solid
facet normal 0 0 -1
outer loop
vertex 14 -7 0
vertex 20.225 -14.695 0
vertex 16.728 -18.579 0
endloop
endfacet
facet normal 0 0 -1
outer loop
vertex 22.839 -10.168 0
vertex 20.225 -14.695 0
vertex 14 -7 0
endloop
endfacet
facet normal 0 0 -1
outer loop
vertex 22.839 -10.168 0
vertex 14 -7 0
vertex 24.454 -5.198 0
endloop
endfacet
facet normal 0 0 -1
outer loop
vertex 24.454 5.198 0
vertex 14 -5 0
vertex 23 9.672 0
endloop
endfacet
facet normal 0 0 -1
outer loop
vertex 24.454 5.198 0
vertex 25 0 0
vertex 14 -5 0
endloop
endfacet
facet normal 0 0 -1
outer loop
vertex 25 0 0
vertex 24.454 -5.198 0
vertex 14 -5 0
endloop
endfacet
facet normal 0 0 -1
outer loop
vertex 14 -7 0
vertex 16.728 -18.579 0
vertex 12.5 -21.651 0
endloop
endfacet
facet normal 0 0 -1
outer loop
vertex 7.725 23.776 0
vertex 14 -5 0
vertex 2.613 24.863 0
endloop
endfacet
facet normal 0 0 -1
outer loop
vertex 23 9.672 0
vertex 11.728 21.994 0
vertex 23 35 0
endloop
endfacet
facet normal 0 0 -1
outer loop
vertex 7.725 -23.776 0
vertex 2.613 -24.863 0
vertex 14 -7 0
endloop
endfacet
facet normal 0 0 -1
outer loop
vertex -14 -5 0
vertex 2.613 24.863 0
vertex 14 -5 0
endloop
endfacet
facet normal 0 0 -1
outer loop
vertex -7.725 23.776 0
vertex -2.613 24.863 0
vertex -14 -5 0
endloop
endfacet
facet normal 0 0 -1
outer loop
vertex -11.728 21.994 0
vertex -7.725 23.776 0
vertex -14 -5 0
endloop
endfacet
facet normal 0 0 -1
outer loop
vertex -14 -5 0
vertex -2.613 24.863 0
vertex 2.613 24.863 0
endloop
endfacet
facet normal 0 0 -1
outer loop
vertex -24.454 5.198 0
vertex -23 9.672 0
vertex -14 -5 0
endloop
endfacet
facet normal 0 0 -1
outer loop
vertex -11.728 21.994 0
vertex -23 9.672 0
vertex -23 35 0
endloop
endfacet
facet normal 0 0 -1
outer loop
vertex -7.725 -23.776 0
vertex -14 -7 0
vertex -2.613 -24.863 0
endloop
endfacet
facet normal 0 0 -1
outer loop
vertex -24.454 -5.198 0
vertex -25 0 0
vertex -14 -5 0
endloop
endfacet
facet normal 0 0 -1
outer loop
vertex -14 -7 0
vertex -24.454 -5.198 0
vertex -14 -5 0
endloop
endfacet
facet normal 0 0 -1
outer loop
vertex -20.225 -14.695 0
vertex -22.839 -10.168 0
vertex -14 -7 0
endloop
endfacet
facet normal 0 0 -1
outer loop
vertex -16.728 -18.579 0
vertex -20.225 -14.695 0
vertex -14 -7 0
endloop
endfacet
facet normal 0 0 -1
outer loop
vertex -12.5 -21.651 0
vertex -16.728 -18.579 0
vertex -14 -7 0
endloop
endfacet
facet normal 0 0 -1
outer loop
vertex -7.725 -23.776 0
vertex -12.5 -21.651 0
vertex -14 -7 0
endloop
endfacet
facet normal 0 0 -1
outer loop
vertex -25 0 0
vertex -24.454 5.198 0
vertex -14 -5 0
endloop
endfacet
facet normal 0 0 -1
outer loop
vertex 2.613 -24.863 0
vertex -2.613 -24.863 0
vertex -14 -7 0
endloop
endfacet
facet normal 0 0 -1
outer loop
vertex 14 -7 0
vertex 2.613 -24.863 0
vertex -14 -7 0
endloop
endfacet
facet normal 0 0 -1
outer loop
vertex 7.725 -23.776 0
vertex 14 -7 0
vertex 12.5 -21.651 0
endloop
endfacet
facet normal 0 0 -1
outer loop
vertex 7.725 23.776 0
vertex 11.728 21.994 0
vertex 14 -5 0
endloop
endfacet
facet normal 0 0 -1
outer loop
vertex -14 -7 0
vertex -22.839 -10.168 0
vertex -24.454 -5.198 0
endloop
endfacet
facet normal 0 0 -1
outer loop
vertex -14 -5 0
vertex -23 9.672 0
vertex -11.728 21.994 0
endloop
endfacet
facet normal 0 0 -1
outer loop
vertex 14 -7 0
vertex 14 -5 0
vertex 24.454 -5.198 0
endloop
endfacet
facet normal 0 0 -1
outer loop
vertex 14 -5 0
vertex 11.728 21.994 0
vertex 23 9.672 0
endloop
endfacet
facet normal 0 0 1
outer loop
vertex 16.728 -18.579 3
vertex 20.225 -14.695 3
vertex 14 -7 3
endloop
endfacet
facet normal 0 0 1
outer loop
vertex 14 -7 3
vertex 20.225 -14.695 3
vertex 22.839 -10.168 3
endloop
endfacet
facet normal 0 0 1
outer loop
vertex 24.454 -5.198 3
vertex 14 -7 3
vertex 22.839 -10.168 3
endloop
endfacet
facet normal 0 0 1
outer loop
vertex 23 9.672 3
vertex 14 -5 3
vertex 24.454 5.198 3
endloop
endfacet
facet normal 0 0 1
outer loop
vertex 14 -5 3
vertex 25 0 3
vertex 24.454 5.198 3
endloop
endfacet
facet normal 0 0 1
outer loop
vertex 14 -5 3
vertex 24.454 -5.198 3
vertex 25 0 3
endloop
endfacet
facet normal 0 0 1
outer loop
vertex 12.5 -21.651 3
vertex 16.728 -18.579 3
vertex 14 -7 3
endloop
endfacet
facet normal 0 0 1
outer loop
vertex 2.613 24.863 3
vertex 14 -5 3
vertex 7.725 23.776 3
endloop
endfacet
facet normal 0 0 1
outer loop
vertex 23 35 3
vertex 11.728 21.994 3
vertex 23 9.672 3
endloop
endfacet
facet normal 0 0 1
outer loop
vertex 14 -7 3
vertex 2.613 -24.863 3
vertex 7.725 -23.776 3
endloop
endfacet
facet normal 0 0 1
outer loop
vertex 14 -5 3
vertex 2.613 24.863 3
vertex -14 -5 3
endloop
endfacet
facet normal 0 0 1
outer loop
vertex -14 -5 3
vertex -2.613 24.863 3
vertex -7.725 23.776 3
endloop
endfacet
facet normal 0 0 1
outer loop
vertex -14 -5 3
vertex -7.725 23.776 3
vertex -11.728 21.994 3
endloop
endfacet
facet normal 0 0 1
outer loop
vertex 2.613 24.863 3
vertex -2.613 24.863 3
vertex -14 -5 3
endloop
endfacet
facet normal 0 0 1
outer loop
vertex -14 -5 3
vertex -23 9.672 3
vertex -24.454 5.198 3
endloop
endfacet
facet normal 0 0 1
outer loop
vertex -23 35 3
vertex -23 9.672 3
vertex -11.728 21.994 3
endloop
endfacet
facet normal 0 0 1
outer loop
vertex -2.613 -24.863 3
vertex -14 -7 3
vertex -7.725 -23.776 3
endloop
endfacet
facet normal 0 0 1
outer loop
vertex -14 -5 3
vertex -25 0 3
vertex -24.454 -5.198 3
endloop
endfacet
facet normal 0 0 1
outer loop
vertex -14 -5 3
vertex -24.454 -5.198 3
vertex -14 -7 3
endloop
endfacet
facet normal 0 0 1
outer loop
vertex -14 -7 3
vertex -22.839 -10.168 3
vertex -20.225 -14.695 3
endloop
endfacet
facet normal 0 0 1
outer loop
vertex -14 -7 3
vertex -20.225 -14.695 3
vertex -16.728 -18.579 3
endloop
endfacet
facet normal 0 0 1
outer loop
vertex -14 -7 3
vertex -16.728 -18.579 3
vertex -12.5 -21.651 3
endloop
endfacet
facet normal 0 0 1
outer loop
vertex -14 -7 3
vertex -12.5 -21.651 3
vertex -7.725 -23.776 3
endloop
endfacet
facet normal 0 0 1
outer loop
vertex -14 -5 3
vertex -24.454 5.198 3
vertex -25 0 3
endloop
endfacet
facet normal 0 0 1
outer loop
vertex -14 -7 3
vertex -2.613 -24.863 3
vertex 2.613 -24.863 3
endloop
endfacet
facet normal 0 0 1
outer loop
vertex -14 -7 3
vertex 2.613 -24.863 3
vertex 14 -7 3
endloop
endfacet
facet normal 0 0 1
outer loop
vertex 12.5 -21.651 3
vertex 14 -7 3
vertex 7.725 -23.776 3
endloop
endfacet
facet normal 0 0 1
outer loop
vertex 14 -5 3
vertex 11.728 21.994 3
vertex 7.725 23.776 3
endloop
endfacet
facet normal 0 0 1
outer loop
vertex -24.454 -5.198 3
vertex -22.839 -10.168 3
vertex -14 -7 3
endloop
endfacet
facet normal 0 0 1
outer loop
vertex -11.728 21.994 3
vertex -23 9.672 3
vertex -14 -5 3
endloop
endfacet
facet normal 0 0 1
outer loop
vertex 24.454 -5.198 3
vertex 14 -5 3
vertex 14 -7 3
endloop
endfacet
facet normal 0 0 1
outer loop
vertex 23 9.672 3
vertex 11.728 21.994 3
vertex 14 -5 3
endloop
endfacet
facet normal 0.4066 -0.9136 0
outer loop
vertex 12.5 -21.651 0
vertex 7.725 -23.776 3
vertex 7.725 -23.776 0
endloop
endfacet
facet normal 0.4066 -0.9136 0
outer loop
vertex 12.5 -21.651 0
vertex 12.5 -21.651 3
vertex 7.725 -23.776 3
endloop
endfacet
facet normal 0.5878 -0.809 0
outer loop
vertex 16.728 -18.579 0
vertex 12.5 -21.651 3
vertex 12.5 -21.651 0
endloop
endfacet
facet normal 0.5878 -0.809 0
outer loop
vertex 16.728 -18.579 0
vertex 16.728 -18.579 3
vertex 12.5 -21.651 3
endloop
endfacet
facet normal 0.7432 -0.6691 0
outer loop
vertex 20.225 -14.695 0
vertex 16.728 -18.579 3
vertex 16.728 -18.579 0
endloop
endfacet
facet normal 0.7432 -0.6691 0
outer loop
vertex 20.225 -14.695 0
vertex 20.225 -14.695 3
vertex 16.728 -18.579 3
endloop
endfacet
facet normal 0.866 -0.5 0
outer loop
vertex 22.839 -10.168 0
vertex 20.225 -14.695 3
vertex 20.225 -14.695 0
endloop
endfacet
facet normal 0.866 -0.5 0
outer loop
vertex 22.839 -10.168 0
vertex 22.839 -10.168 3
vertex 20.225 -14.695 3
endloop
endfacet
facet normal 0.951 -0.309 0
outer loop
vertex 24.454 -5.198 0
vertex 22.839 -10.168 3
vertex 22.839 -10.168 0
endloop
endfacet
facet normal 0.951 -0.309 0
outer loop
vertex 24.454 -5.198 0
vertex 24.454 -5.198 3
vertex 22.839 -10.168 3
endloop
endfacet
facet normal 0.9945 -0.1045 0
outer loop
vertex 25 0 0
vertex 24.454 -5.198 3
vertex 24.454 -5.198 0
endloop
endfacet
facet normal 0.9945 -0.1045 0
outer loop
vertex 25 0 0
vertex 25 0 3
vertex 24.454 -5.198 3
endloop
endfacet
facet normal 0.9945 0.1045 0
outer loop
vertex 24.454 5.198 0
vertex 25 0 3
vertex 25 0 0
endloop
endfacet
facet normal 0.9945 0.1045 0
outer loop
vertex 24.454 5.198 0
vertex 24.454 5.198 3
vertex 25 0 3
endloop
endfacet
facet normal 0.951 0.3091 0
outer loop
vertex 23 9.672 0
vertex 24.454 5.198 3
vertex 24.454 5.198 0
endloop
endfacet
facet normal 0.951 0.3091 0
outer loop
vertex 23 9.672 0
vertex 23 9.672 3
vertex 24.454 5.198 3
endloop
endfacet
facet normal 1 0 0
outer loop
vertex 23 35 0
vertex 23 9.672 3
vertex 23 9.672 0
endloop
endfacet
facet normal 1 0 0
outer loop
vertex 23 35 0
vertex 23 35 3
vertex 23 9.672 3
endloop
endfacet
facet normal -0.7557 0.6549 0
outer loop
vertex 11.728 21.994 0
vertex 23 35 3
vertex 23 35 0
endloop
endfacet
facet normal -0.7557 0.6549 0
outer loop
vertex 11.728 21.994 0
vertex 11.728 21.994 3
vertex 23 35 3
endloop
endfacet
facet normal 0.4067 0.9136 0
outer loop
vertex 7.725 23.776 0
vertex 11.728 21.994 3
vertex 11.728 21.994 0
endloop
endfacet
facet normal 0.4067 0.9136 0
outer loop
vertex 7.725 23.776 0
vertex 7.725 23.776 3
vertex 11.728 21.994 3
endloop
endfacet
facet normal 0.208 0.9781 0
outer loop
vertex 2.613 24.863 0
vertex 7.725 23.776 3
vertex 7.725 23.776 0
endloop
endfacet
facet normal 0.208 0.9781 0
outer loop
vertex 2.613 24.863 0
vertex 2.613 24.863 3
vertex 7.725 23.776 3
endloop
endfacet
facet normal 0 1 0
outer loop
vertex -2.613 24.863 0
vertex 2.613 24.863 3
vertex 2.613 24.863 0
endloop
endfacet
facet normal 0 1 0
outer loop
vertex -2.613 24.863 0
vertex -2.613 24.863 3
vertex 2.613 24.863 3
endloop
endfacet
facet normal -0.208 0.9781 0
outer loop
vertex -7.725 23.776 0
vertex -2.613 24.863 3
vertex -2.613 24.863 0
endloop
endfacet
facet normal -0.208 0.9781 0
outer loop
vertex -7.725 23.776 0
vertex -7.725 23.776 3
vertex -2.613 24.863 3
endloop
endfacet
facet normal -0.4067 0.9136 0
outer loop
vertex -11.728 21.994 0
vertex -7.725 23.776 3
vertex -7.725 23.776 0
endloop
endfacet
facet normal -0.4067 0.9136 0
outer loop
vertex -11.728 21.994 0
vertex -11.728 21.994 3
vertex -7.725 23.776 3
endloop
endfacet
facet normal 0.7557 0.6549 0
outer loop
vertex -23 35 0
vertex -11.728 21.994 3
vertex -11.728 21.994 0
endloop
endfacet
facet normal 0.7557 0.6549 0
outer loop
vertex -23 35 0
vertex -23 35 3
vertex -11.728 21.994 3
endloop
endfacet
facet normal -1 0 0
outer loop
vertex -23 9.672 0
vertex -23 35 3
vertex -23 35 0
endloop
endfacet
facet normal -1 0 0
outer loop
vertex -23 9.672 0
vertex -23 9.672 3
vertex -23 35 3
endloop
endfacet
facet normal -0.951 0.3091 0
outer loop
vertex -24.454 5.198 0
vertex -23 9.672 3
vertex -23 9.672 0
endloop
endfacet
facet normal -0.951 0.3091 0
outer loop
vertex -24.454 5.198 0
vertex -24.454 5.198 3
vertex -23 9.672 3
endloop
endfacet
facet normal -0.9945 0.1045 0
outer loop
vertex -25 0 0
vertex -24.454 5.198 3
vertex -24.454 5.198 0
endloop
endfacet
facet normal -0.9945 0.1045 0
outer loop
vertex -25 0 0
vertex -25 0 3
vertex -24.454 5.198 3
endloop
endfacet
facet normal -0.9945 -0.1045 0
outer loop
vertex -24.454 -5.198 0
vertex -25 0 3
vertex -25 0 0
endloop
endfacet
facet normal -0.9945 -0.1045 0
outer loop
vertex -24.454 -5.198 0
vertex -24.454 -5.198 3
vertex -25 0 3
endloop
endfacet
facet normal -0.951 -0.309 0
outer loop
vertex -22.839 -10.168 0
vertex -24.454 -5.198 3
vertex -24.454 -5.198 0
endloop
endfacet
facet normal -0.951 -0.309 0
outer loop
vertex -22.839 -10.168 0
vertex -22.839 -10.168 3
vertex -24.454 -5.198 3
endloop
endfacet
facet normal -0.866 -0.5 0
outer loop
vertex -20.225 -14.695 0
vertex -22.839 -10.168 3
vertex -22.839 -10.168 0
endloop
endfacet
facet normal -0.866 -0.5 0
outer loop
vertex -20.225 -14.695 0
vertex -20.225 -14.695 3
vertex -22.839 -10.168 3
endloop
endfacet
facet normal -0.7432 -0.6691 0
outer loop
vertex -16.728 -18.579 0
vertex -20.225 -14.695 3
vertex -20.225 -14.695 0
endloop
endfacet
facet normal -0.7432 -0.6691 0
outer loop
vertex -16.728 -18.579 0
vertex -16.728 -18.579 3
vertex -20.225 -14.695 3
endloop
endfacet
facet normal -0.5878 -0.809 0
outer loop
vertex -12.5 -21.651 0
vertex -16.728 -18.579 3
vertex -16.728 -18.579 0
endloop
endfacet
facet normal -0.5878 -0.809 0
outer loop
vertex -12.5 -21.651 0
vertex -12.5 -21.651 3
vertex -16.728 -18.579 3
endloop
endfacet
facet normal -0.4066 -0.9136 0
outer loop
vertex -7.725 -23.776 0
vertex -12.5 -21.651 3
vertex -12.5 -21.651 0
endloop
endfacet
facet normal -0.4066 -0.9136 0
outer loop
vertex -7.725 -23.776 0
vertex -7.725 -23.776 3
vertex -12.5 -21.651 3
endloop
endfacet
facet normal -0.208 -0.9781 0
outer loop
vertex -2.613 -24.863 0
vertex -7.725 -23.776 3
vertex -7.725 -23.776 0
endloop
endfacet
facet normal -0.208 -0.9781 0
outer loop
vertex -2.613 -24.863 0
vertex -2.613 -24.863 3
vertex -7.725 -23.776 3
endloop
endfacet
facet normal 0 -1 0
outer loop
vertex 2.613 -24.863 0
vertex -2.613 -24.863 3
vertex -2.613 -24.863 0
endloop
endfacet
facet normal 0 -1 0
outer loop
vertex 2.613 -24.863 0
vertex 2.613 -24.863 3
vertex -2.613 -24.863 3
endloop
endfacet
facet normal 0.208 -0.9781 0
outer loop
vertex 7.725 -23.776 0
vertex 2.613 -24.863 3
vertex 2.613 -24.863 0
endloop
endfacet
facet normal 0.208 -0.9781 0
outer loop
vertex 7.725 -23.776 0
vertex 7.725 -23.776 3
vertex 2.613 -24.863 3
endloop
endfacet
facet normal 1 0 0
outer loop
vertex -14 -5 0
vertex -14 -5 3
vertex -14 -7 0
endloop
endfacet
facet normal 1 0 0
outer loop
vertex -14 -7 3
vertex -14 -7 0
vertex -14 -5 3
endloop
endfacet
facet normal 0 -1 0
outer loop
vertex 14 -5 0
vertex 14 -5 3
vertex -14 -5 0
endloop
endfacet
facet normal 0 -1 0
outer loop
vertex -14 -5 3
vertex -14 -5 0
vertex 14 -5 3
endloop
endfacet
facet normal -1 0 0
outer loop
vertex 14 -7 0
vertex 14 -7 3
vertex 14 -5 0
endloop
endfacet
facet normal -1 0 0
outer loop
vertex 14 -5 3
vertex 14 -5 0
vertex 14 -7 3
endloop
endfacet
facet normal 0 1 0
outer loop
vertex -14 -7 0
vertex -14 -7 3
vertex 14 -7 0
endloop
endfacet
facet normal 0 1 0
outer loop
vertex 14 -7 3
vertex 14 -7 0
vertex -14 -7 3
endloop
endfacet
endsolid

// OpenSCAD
linear_extrude(3) {
    difference() {
        union() {
            circle(d=50);
            polygon([
                [-23, 0],
                [-23, 35],
                [-10, 20]
            ]);
            polygon([
                [23, 0],
                [23, 35],
                [10, 20]
            ]);
        }
        translate([-14, -7]) square([28, 2]);
    }
}
